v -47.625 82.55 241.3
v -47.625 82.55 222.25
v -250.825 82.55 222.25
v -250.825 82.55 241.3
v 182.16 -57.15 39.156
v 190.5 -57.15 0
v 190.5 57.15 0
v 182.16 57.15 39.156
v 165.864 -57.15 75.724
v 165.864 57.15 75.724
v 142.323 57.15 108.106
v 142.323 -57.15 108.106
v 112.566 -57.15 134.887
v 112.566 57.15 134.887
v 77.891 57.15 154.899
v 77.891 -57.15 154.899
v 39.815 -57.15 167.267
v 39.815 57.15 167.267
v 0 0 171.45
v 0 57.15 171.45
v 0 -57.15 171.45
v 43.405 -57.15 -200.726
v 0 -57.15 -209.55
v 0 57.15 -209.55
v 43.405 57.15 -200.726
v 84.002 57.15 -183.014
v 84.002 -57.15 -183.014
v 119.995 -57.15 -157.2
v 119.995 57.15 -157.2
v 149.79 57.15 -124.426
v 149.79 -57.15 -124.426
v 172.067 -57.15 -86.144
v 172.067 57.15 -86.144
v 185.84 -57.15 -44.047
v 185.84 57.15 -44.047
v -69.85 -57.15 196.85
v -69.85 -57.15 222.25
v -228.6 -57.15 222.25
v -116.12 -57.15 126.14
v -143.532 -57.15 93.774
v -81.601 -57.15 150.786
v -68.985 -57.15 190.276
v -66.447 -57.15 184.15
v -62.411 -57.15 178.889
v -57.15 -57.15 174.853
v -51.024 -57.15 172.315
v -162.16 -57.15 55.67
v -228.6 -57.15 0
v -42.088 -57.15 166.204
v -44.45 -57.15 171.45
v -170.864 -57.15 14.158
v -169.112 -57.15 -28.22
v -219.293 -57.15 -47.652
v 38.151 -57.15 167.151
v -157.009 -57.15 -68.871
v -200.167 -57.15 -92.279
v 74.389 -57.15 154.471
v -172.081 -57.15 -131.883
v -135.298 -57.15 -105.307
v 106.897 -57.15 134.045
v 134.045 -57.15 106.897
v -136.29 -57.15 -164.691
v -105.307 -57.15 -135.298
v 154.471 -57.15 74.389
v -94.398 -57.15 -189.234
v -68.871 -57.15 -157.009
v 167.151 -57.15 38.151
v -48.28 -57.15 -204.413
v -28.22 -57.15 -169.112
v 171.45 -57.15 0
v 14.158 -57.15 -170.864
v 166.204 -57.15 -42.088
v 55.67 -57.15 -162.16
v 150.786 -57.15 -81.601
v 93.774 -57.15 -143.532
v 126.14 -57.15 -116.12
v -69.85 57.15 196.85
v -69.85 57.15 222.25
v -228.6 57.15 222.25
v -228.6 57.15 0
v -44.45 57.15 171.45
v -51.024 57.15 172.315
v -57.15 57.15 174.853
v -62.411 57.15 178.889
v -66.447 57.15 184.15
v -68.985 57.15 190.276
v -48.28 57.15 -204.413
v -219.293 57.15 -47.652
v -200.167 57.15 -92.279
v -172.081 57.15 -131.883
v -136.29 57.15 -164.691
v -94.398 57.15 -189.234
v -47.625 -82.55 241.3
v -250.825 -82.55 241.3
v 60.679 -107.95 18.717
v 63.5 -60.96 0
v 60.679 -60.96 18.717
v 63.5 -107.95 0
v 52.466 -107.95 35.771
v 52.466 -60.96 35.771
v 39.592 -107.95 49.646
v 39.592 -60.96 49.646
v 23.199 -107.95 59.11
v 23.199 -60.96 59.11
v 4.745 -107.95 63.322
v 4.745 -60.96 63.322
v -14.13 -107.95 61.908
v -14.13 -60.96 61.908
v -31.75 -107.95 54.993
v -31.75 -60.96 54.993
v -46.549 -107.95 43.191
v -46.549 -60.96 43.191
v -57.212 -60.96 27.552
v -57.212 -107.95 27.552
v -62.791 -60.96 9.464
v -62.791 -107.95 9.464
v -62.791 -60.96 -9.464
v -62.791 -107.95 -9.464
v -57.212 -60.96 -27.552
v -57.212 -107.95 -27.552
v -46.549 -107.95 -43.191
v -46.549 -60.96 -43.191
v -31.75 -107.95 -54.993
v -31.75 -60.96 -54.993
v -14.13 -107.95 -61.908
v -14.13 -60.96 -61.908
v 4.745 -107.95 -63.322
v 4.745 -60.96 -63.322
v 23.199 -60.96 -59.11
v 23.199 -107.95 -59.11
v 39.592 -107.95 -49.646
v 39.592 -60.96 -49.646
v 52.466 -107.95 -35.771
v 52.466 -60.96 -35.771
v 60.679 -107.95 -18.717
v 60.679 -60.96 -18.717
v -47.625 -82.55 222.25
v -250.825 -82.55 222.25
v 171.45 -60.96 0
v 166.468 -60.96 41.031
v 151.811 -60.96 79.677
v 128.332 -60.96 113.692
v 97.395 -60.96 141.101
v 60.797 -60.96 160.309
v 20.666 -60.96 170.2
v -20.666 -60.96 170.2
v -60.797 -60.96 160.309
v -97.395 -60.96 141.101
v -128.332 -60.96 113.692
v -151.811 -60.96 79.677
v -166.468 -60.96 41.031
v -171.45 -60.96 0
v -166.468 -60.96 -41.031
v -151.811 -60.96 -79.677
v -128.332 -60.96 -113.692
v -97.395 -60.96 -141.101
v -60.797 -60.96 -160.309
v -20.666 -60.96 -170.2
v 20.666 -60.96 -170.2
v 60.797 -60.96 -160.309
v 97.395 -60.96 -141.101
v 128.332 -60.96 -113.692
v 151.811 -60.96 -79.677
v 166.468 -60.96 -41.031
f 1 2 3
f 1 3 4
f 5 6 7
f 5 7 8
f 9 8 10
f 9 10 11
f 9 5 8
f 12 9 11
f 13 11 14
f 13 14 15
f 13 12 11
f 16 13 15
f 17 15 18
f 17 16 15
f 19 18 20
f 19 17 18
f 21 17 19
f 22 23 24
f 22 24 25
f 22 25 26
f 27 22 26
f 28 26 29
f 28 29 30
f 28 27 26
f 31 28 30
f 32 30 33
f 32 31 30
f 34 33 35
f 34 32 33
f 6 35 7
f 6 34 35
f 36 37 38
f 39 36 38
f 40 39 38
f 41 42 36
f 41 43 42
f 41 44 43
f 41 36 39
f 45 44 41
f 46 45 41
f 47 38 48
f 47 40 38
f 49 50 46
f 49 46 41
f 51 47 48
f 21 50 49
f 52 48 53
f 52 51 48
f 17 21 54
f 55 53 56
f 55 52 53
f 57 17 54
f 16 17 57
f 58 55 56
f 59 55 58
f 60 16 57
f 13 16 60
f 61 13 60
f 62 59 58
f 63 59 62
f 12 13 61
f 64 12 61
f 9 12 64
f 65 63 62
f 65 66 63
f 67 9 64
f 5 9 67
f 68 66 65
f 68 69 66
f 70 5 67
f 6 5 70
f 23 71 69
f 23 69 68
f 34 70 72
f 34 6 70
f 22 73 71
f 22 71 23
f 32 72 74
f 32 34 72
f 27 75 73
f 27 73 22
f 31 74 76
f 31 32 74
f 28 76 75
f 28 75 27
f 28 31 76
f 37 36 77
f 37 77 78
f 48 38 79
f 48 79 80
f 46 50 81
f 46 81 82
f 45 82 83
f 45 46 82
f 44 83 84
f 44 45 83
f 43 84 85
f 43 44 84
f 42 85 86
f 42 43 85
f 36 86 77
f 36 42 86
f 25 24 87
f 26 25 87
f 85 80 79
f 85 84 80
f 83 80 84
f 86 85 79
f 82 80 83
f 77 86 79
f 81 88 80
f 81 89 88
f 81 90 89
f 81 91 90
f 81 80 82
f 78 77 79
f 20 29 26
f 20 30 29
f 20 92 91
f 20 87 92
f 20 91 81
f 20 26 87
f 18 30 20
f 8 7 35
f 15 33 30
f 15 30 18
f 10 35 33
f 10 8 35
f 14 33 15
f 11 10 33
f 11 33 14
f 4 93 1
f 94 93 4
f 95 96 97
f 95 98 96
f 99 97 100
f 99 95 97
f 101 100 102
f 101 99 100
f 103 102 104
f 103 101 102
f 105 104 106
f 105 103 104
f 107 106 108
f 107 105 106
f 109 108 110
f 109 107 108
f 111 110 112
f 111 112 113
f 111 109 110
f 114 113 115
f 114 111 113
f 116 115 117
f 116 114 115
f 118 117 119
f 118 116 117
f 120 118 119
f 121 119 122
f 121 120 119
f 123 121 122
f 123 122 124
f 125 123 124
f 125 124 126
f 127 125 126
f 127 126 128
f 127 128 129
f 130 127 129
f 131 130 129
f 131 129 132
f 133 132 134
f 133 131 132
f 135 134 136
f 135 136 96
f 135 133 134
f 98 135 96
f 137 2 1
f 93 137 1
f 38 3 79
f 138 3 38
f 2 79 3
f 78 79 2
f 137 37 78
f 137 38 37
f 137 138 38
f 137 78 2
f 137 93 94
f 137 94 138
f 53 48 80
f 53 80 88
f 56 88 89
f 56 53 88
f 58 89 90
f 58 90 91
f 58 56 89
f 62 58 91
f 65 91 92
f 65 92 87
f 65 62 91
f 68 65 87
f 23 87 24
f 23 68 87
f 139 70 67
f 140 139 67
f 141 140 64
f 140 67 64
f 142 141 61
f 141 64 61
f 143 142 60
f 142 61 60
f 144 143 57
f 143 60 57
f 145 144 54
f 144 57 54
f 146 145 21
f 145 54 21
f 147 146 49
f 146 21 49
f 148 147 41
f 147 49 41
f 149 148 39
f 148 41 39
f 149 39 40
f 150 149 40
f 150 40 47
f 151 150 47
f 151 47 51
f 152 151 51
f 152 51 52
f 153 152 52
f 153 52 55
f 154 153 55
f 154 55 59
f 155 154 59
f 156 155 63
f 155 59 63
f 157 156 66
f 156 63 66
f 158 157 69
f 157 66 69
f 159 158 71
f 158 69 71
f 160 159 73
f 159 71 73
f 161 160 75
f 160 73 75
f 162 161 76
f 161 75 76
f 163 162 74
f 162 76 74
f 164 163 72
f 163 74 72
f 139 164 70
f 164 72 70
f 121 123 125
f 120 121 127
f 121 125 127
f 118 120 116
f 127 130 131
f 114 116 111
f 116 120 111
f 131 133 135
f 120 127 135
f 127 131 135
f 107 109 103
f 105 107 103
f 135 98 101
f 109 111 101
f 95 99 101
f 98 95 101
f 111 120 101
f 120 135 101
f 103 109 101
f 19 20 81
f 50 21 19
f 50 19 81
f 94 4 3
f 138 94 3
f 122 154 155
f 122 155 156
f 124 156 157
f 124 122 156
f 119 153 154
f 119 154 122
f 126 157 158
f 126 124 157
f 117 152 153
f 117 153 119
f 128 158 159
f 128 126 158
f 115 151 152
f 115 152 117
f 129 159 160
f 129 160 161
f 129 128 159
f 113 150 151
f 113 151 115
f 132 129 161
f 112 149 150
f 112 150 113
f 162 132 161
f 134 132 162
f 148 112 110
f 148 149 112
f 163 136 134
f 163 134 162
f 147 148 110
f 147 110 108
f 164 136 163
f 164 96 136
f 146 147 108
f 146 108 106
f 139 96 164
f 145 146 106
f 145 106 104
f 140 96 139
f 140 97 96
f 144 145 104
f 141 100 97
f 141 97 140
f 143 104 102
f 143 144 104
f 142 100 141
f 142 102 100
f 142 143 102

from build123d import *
from build123d import SkipClean  # not in build123d's __all__

# Parameters (mm, degrees)
F0_R     = 63.5
F2_DEPTH = 1270
F3_DEPTH = 1270
F4_DEPTH = 1270
F1_W     = 50.8
F1_H     = 127
F5_DEPTH = 1270
F6_DEPTH = 60.96


with BuildPart() as f2:
    # F0 (on Front) → F2 (new body, symmetric)
    with BuildSketch(Plane.XZ):
        Polygon((-228.6, 222.25), (-69.85, 222.25), (-47.625, 222.25), (-47.625, 241.3), (-250.825, 241.3), (-250.825, 222.25), align=None)
        with BuildLine():
            ThreePointArc((190.5, 0), (128.1457690484, 122.2758544982), (0, 171.45))
            Line((0, 171.45), (-44.45, 171.45))
            ThreePointArc((-44.45, 171.45), (-62.4105122421, 178.8894877579), (-69.85, 196.85))
            Line((-69.85, 196.85), (-69.85, 222.25))
            Line((-69.85, 222.25), (-228.6, 222.25))
            Line((-228.6, 222.25), (-228.6, 0))
            ThreePointArc((-228.6, 0), (-155.0557661778, -149.2358358304), (0, -209.55))
            ThreePointArc((0, -209.55), (135.7567353, -141.5993048182), (190.5, 0))
        make_face()
        with BuildLine():
            ThreePointArc((0, 171.45), (121.2334576344, 121.2334576344), (171.45, 0))
            ThreePointArc((171.45, 0), (-121.2334576344, -121.2334576344), (0, 171.45))
        make_face(mode=Mode.SUBTRACT)
        with BuildLine():
            ThreePointArc((0, 171.45), (-121.2334576344, -121.2334576344), (171.45, 0))
            ThreePointArc((171.45, 0), (121.2334576344, 121.2334576344), (0, 171.45))
        make_face()
        Circle(F0_R, mode=Mode.SUBTRACT)
        Circle(F0_R)
    extrude(amount=F2_DEPTH, both=True)

    # F1 (on Right) → F3 (intersect, symmetric)
    with BuildSketch(Plane.YZ):
        Polygon((-57.15, 222.25), (57.15, 222.25), (82.55, 222.25), (82.55, 241.3), (-82.55, 241.3), (-82.55, 222.25), align=None)
        Polygon((-57.15, -63.5), (-57.15, -209.55), (57.15, -209.55), (57.15, 222.25), (-57.15, 222.25), (-57.15, 63.5), align=None)
    extrude(amount=F3_DEPTH, both=True, mode=Mode.INTERSECT)



with BuildPart() as f4:
    # F0 (on Front) → F4 (new body, symmetric)
    with BuildSketch(Plane.XZ):
        Circle(F0_R)
    extrude(amount=F4_DEPTH, both=True)

    # F1 (on Right) → F5 (intersect, symmetric)
    with BuildSketch(Plane.YZ):
        with Locations((-82.55, 0)):
            Rectangle(F1_W, F1_H)
    extrude(amount=F5_DEPTH, both=True, mode=Mode.INTERSECT)


with BuildPart() as f2_1:
    add(f2.part, clean=False)

    with SkipClean():  # cleaning this boolean's faces spoils the solid; the shape is the same uncleaned
        add(f4.part)  # F6 merges F4
    # F0 (on Front) → F6 (join)
    with BuildSketch(Plane.XZ):
        with BuildLine():
            ThreePointArc((0, 171.45), (-121.2334576344, -121.2334576344), (171.45, 0))
            ThreePointArc((171.45, 0), (121.2334576344, 121.2334576344), (0, 171.45))
        make_face()
        Circle(F0_R, mode=Mode.SUBTRACT)
    with SkipClean():  # cleaning this boolean's faces spoils the solid; the shape is the same uncleaned
        extrude(amount=F6_DEPTH)


solid = f2_1.part
